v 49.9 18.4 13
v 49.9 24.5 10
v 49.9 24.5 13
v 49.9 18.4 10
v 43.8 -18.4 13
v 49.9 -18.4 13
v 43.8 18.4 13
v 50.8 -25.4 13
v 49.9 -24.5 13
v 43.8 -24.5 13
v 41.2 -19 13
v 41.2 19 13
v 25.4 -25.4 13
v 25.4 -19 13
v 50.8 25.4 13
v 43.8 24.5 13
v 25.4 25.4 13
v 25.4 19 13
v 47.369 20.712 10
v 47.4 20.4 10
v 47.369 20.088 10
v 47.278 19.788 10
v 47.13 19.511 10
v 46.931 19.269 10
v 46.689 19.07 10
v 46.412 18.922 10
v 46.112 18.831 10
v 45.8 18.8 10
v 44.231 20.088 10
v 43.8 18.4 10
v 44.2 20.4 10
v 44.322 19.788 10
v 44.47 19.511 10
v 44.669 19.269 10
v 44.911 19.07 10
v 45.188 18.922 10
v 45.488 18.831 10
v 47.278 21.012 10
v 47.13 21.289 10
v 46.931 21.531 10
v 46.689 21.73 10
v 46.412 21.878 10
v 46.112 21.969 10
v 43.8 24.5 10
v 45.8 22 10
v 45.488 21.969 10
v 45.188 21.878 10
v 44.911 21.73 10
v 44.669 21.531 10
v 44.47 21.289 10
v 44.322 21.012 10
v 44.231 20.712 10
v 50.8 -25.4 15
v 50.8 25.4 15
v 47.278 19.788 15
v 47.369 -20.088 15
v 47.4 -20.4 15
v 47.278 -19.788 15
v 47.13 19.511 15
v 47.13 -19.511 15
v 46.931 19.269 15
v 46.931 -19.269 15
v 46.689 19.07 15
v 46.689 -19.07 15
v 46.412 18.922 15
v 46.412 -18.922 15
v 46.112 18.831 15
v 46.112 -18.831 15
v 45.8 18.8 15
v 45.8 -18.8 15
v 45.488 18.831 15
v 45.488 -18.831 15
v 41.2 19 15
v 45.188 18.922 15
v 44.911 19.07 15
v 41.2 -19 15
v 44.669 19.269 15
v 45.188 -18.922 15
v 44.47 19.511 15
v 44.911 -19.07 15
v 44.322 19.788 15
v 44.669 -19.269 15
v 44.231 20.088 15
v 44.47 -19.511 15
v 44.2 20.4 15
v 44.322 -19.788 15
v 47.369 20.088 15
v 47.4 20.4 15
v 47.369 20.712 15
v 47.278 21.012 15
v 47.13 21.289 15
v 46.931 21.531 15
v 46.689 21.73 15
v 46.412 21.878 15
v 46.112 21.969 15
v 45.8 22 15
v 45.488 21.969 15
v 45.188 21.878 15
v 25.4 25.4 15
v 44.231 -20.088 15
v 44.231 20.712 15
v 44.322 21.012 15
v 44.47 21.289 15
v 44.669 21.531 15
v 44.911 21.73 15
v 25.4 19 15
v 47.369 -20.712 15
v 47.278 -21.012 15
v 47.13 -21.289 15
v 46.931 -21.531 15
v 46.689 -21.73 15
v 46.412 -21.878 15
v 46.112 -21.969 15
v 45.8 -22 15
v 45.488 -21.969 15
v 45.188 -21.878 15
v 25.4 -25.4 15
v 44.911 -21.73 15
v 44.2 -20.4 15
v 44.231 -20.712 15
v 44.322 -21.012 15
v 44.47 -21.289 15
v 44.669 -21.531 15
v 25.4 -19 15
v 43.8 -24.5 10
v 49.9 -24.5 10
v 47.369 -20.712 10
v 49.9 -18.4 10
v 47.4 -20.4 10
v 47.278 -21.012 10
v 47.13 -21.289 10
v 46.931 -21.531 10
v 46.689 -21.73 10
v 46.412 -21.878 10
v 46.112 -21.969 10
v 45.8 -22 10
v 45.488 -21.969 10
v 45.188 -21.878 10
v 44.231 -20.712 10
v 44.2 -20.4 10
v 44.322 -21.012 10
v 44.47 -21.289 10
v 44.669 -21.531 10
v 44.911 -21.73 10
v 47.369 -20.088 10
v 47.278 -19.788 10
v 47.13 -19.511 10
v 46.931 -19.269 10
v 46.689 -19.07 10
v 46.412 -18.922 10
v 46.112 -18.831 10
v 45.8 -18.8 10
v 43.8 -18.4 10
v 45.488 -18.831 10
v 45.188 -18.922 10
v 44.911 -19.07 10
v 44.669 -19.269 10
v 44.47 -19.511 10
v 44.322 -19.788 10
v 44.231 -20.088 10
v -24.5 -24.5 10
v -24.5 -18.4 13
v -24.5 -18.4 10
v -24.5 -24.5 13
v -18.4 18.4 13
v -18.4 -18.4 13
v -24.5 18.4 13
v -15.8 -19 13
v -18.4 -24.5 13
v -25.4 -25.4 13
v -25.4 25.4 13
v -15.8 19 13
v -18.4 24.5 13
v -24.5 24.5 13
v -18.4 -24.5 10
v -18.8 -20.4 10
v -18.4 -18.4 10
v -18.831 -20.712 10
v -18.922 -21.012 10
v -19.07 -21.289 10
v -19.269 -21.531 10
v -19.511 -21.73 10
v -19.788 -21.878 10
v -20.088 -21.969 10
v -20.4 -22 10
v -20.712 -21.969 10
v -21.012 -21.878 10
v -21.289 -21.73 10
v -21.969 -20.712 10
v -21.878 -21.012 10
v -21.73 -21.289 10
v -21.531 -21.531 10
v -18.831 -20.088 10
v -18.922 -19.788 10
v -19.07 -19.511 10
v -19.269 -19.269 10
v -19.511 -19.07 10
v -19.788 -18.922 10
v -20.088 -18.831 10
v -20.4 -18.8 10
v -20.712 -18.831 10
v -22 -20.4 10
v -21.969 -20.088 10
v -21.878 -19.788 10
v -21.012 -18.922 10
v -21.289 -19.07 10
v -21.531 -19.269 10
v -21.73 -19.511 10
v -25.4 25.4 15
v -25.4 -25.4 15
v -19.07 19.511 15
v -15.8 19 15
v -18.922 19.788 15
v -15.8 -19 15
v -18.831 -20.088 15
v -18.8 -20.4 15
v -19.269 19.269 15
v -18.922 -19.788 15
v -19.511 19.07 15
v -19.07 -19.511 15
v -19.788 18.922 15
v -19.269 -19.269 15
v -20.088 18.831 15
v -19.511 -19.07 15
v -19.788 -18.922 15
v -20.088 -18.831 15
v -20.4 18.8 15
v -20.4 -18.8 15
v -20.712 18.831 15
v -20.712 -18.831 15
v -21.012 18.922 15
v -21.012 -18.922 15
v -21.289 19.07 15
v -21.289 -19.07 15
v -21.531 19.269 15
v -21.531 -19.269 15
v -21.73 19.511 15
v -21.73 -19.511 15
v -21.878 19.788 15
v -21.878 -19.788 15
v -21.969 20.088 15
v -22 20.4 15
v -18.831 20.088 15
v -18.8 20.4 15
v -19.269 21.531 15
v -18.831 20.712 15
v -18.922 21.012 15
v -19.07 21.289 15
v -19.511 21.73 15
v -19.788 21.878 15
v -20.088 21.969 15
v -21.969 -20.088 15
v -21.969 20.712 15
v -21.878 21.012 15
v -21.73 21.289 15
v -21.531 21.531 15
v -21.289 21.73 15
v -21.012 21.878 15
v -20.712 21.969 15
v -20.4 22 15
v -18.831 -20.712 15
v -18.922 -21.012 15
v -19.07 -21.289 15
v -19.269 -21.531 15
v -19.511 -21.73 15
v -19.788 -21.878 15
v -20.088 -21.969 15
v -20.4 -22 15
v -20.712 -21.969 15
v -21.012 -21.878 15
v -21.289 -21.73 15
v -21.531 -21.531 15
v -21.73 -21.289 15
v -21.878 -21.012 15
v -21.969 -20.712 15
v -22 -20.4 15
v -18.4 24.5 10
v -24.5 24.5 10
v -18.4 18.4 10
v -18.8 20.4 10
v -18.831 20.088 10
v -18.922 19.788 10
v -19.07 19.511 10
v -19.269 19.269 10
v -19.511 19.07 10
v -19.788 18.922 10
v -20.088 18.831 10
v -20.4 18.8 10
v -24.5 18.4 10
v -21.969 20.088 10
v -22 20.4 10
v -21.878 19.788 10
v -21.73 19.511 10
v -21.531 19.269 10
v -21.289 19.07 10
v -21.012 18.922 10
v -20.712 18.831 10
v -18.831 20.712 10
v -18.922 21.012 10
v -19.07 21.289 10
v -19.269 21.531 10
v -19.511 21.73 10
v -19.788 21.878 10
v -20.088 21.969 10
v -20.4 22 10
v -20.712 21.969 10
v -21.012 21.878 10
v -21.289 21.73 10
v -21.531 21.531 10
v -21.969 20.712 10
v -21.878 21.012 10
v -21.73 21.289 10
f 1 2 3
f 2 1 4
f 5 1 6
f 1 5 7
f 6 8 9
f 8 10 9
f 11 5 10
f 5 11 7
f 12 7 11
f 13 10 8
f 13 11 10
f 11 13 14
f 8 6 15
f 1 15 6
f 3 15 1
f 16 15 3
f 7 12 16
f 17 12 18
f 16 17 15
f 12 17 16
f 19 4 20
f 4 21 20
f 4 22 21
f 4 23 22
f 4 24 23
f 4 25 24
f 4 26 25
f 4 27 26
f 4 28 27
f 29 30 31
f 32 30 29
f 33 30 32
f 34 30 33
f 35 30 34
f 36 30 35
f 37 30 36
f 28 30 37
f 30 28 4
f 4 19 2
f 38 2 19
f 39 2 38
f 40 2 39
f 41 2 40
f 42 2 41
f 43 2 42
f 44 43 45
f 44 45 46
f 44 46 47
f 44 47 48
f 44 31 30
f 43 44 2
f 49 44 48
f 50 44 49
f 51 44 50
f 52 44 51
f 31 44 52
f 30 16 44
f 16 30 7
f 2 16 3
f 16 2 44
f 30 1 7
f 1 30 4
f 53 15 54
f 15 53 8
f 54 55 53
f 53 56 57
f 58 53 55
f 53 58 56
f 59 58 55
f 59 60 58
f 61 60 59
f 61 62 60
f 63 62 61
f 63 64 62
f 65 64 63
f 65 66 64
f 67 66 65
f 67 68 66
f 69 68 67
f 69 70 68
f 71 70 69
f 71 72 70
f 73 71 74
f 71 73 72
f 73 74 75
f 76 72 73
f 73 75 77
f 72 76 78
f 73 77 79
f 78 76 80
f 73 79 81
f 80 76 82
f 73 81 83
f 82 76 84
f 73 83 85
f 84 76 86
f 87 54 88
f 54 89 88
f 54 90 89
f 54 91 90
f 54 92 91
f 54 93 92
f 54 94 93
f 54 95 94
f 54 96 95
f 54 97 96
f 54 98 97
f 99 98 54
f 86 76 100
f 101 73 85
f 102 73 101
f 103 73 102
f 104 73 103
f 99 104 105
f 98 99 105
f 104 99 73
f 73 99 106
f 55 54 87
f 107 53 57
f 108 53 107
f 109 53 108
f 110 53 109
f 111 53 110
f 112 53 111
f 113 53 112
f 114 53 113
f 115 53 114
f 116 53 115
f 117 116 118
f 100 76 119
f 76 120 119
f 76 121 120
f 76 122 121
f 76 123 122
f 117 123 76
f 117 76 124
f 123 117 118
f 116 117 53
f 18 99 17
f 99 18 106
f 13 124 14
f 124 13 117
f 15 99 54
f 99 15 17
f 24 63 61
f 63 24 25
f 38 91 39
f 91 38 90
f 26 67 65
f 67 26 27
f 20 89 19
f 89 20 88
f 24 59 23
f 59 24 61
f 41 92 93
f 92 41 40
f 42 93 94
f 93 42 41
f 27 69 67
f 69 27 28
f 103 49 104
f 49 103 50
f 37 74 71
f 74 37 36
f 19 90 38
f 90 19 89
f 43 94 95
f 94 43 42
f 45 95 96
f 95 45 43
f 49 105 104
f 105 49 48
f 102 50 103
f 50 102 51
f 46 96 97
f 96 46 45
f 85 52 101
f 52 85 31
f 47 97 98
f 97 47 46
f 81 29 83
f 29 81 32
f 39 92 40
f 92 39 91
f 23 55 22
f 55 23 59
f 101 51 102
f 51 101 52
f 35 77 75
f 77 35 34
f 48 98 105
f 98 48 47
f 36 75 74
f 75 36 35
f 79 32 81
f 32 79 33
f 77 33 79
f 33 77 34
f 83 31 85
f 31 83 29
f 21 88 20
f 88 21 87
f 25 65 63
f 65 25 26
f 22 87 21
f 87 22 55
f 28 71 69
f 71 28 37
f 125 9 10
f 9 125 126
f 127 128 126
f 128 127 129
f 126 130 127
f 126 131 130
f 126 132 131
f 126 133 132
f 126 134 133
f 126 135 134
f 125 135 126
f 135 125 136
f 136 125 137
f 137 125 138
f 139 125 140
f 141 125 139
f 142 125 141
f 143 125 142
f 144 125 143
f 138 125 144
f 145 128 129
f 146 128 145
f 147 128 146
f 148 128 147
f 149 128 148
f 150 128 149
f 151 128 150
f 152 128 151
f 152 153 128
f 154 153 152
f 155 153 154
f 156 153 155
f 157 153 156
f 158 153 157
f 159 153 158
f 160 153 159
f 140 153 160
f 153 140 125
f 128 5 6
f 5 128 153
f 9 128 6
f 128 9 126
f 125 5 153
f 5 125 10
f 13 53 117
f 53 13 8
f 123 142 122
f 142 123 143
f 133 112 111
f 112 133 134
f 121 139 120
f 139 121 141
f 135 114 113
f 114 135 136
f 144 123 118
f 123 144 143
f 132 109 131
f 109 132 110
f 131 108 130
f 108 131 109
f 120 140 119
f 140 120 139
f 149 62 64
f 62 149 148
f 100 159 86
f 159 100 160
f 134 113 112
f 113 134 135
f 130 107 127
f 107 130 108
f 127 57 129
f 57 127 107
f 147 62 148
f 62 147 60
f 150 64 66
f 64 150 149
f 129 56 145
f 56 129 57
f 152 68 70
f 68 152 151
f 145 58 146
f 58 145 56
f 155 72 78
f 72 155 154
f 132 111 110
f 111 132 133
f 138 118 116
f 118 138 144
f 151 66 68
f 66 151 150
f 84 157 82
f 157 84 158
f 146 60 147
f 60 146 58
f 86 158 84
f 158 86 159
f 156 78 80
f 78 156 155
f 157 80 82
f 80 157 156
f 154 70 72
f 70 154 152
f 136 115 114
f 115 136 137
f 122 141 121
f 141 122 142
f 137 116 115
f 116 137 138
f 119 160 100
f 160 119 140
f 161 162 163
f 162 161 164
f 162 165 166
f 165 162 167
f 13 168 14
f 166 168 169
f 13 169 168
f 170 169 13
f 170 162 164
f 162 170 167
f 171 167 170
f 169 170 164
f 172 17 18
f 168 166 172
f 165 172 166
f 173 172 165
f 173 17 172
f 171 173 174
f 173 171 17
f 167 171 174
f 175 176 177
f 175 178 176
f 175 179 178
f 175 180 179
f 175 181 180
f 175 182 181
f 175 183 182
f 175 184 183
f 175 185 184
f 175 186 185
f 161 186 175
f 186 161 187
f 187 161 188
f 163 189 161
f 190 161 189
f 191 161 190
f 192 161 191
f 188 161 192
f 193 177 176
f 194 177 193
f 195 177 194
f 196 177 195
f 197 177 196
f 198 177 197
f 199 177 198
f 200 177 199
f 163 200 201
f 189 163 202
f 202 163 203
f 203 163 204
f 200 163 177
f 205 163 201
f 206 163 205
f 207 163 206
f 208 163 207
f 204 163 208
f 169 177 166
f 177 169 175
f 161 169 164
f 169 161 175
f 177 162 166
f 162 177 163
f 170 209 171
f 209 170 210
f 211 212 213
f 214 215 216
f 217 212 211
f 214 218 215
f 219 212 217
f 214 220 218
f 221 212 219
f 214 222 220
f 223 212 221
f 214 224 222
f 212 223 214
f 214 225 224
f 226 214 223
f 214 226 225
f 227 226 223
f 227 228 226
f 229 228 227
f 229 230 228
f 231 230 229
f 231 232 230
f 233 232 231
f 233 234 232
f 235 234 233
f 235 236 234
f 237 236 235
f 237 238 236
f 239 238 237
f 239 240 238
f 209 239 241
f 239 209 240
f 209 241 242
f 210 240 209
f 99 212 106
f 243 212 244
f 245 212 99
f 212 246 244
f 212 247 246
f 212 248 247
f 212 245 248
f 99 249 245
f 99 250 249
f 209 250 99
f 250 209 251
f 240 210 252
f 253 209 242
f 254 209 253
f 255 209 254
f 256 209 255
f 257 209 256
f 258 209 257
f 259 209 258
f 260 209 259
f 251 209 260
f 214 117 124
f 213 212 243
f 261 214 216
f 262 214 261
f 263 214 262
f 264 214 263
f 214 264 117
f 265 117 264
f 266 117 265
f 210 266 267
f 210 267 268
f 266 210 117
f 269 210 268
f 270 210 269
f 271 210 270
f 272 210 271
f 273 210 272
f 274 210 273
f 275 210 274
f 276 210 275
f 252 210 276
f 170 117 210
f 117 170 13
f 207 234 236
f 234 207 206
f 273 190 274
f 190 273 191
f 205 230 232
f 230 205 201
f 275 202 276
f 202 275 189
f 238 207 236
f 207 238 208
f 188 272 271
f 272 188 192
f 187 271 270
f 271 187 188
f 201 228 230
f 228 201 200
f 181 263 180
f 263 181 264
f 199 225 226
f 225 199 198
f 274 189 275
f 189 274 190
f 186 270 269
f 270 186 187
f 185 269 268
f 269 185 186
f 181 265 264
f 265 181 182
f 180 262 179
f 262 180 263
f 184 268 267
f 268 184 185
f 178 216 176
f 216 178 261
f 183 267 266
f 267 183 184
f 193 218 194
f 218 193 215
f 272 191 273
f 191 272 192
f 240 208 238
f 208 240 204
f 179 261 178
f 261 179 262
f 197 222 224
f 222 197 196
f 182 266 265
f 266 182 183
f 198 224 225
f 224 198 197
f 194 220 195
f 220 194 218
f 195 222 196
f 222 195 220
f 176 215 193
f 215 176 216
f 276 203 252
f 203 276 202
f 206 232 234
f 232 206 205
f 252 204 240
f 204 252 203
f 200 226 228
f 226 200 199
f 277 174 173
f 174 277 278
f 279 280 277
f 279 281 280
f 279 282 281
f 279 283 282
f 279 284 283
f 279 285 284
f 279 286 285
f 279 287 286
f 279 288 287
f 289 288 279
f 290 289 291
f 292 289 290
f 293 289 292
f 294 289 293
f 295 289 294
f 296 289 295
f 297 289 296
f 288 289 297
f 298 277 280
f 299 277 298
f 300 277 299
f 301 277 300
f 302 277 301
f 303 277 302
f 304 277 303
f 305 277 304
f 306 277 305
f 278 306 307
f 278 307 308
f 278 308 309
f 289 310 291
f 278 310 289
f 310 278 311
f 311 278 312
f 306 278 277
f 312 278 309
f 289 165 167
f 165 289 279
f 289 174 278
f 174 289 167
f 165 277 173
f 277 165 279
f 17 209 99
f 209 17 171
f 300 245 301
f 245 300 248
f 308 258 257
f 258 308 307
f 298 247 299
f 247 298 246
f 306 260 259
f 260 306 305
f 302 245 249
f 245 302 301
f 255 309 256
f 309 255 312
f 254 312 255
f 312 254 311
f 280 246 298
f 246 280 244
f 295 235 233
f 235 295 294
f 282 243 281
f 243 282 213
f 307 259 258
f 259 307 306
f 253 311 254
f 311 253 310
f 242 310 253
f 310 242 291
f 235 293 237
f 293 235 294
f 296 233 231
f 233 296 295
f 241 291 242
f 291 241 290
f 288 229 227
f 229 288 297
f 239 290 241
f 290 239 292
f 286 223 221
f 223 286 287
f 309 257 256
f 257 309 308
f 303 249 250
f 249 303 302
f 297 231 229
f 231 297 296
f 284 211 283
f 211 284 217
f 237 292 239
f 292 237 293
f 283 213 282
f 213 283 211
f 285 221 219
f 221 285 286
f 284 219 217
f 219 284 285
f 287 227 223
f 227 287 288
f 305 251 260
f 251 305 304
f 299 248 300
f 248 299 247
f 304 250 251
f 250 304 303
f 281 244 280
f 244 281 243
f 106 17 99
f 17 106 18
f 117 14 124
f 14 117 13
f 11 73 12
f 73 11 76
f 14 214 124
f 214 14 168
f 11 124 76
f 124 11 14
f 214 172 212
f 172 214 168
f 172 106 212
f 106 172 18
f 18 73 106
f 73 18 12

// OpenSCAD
base = 4;
wall_height = 0.9;







module corner_base(){
    cube([25.4,25.4,base],center = false);
    rotate([0,0,270]){
        translate([0,0,0]){
            mirror([1,0,0]){
                difference(){
        union(){
            
            translate([0,25.4-wall_height,base])
                cube([25.4,0.9,9]);
            translate([0,17.4,base])
                    cube([7.1,7.1,4],center = false);
            
            difference(){
                translate([17.4,17.4,base])
                    cube([7.1,7.1,4],center = false);
                translate([20.4,20.4,base+2.5])
                    cylinder(h = 5, r = 1.6,center = true,$fn = 32  );
            }
        }
        translate([25.4/2 - 11/2,25.4-2,base+4])
            cube([11,5,10]);
        translate([3.6,24.9,base+2]){
            rotate([90,0,0])
            cylinder(h=3,r=1.6,center = true,$fn = 32);
    }
        translate([21.8,24.9,base+2]){
            rotate([90,0,0])
                cylinder(h=3,r=1.6,center = true,$fn = 32);
    }
    }   
                
            }
            
    }      
        
    }

    difference(){
        union(){
            
            translate([0,25.4-wall_height,base])
                cube([25.4,0.9,9]);
            translate([0,17.4,base])
                    cube([7.1,7.1,4],center = false);
            
            difference(){
                translate([17.4,17.4,base])
                    cube([7.1,7.1,4],center = false);
                translate([20.4,20.4,base+2.5])
                    cylinder(h = 5, r = 1.6,center = true,$fn = 32  );
            }
        }
        translate([25.4/2 - 11/2,25.4-2,base+4])
            cube([11,5,10]);
        translate([3.6,24.9,base+2]){
            rotate([90,0,0])
            cylinder(h=3,r=1.6,center = true,$fn = 32);
    }
        translate([21.8,24.9,base+2]){
            rotate([90,0,0])
                cylinder(h=3,r=1.6,center = true,$fn = 32);
    }
    }   
}
















module edge_base(){
    translate([-25.4,0,0]){

        cube([25.4,25.4,base],center = false);
        

        difference(){
            union(){
                
                translate([0,25.4-wall_height,base])
                    cube([25.4,0.9,9]);
                translate([0,17.4,base])
                        cube([7.1,7.1,4],center = false);
                
                difference(){
                    translate([17.4,17.4,base])
                        cube([7.1,7.1,4],center = false);
                    
                }
            }
            translate([25.4/2 - 11/2,25.4-2,base+4])
                cube([11,5,10]);
            translate([3.6,24.9,base+2]){
                rotate([90,0,0])
                cylinder(h=3,r=1.6,center = true,$fn = 32);
        }
            translate([21.8,24.9,base+2]){
                rotate([90,0,0])
                    cylinder(h=3,r=1.6,center = true,$fn = 32);
        }
        }
    }

}








module corner_top(){
    difference(){
        union(){
            translate([18.4,18.4,10]){
                cube([6.1,6.1,3]);
            }
            translate([0,0,9+base]){
                cube([25.4,25.4,2]);
            }
        }
        
        
        translate([20.4,20.4,12.5])
            cylinder(h = 15, r = 1.6,center = true,$fn = 32  );

    }
}


















difference(){
    union(){
        
        translate([+25.4,0,0])

            corner_top();

        translate([+25.4,0,0])
            rotate([0,0,270])
                corner_top();


        rotate([0,0,180])
            corner_top();
        rotate([0,0,90])
                corner_top();
        translate([0,0,9+base]){
        cube([25.4,25.4,2]);
        }
        rotate([0,0,270])
            translate([0,0,9+base]){
                cube([25.4,25.4,2]);
        }
    }


    translate([0,0,12])
        linear_extrude(height = 5)
            difference(){
                translate([12.7,0])
                    square([57,38],center = true);
                
                translate([-28.575+12.7,19.05])
                    
                        import("plate.dxf");

            }
        }
